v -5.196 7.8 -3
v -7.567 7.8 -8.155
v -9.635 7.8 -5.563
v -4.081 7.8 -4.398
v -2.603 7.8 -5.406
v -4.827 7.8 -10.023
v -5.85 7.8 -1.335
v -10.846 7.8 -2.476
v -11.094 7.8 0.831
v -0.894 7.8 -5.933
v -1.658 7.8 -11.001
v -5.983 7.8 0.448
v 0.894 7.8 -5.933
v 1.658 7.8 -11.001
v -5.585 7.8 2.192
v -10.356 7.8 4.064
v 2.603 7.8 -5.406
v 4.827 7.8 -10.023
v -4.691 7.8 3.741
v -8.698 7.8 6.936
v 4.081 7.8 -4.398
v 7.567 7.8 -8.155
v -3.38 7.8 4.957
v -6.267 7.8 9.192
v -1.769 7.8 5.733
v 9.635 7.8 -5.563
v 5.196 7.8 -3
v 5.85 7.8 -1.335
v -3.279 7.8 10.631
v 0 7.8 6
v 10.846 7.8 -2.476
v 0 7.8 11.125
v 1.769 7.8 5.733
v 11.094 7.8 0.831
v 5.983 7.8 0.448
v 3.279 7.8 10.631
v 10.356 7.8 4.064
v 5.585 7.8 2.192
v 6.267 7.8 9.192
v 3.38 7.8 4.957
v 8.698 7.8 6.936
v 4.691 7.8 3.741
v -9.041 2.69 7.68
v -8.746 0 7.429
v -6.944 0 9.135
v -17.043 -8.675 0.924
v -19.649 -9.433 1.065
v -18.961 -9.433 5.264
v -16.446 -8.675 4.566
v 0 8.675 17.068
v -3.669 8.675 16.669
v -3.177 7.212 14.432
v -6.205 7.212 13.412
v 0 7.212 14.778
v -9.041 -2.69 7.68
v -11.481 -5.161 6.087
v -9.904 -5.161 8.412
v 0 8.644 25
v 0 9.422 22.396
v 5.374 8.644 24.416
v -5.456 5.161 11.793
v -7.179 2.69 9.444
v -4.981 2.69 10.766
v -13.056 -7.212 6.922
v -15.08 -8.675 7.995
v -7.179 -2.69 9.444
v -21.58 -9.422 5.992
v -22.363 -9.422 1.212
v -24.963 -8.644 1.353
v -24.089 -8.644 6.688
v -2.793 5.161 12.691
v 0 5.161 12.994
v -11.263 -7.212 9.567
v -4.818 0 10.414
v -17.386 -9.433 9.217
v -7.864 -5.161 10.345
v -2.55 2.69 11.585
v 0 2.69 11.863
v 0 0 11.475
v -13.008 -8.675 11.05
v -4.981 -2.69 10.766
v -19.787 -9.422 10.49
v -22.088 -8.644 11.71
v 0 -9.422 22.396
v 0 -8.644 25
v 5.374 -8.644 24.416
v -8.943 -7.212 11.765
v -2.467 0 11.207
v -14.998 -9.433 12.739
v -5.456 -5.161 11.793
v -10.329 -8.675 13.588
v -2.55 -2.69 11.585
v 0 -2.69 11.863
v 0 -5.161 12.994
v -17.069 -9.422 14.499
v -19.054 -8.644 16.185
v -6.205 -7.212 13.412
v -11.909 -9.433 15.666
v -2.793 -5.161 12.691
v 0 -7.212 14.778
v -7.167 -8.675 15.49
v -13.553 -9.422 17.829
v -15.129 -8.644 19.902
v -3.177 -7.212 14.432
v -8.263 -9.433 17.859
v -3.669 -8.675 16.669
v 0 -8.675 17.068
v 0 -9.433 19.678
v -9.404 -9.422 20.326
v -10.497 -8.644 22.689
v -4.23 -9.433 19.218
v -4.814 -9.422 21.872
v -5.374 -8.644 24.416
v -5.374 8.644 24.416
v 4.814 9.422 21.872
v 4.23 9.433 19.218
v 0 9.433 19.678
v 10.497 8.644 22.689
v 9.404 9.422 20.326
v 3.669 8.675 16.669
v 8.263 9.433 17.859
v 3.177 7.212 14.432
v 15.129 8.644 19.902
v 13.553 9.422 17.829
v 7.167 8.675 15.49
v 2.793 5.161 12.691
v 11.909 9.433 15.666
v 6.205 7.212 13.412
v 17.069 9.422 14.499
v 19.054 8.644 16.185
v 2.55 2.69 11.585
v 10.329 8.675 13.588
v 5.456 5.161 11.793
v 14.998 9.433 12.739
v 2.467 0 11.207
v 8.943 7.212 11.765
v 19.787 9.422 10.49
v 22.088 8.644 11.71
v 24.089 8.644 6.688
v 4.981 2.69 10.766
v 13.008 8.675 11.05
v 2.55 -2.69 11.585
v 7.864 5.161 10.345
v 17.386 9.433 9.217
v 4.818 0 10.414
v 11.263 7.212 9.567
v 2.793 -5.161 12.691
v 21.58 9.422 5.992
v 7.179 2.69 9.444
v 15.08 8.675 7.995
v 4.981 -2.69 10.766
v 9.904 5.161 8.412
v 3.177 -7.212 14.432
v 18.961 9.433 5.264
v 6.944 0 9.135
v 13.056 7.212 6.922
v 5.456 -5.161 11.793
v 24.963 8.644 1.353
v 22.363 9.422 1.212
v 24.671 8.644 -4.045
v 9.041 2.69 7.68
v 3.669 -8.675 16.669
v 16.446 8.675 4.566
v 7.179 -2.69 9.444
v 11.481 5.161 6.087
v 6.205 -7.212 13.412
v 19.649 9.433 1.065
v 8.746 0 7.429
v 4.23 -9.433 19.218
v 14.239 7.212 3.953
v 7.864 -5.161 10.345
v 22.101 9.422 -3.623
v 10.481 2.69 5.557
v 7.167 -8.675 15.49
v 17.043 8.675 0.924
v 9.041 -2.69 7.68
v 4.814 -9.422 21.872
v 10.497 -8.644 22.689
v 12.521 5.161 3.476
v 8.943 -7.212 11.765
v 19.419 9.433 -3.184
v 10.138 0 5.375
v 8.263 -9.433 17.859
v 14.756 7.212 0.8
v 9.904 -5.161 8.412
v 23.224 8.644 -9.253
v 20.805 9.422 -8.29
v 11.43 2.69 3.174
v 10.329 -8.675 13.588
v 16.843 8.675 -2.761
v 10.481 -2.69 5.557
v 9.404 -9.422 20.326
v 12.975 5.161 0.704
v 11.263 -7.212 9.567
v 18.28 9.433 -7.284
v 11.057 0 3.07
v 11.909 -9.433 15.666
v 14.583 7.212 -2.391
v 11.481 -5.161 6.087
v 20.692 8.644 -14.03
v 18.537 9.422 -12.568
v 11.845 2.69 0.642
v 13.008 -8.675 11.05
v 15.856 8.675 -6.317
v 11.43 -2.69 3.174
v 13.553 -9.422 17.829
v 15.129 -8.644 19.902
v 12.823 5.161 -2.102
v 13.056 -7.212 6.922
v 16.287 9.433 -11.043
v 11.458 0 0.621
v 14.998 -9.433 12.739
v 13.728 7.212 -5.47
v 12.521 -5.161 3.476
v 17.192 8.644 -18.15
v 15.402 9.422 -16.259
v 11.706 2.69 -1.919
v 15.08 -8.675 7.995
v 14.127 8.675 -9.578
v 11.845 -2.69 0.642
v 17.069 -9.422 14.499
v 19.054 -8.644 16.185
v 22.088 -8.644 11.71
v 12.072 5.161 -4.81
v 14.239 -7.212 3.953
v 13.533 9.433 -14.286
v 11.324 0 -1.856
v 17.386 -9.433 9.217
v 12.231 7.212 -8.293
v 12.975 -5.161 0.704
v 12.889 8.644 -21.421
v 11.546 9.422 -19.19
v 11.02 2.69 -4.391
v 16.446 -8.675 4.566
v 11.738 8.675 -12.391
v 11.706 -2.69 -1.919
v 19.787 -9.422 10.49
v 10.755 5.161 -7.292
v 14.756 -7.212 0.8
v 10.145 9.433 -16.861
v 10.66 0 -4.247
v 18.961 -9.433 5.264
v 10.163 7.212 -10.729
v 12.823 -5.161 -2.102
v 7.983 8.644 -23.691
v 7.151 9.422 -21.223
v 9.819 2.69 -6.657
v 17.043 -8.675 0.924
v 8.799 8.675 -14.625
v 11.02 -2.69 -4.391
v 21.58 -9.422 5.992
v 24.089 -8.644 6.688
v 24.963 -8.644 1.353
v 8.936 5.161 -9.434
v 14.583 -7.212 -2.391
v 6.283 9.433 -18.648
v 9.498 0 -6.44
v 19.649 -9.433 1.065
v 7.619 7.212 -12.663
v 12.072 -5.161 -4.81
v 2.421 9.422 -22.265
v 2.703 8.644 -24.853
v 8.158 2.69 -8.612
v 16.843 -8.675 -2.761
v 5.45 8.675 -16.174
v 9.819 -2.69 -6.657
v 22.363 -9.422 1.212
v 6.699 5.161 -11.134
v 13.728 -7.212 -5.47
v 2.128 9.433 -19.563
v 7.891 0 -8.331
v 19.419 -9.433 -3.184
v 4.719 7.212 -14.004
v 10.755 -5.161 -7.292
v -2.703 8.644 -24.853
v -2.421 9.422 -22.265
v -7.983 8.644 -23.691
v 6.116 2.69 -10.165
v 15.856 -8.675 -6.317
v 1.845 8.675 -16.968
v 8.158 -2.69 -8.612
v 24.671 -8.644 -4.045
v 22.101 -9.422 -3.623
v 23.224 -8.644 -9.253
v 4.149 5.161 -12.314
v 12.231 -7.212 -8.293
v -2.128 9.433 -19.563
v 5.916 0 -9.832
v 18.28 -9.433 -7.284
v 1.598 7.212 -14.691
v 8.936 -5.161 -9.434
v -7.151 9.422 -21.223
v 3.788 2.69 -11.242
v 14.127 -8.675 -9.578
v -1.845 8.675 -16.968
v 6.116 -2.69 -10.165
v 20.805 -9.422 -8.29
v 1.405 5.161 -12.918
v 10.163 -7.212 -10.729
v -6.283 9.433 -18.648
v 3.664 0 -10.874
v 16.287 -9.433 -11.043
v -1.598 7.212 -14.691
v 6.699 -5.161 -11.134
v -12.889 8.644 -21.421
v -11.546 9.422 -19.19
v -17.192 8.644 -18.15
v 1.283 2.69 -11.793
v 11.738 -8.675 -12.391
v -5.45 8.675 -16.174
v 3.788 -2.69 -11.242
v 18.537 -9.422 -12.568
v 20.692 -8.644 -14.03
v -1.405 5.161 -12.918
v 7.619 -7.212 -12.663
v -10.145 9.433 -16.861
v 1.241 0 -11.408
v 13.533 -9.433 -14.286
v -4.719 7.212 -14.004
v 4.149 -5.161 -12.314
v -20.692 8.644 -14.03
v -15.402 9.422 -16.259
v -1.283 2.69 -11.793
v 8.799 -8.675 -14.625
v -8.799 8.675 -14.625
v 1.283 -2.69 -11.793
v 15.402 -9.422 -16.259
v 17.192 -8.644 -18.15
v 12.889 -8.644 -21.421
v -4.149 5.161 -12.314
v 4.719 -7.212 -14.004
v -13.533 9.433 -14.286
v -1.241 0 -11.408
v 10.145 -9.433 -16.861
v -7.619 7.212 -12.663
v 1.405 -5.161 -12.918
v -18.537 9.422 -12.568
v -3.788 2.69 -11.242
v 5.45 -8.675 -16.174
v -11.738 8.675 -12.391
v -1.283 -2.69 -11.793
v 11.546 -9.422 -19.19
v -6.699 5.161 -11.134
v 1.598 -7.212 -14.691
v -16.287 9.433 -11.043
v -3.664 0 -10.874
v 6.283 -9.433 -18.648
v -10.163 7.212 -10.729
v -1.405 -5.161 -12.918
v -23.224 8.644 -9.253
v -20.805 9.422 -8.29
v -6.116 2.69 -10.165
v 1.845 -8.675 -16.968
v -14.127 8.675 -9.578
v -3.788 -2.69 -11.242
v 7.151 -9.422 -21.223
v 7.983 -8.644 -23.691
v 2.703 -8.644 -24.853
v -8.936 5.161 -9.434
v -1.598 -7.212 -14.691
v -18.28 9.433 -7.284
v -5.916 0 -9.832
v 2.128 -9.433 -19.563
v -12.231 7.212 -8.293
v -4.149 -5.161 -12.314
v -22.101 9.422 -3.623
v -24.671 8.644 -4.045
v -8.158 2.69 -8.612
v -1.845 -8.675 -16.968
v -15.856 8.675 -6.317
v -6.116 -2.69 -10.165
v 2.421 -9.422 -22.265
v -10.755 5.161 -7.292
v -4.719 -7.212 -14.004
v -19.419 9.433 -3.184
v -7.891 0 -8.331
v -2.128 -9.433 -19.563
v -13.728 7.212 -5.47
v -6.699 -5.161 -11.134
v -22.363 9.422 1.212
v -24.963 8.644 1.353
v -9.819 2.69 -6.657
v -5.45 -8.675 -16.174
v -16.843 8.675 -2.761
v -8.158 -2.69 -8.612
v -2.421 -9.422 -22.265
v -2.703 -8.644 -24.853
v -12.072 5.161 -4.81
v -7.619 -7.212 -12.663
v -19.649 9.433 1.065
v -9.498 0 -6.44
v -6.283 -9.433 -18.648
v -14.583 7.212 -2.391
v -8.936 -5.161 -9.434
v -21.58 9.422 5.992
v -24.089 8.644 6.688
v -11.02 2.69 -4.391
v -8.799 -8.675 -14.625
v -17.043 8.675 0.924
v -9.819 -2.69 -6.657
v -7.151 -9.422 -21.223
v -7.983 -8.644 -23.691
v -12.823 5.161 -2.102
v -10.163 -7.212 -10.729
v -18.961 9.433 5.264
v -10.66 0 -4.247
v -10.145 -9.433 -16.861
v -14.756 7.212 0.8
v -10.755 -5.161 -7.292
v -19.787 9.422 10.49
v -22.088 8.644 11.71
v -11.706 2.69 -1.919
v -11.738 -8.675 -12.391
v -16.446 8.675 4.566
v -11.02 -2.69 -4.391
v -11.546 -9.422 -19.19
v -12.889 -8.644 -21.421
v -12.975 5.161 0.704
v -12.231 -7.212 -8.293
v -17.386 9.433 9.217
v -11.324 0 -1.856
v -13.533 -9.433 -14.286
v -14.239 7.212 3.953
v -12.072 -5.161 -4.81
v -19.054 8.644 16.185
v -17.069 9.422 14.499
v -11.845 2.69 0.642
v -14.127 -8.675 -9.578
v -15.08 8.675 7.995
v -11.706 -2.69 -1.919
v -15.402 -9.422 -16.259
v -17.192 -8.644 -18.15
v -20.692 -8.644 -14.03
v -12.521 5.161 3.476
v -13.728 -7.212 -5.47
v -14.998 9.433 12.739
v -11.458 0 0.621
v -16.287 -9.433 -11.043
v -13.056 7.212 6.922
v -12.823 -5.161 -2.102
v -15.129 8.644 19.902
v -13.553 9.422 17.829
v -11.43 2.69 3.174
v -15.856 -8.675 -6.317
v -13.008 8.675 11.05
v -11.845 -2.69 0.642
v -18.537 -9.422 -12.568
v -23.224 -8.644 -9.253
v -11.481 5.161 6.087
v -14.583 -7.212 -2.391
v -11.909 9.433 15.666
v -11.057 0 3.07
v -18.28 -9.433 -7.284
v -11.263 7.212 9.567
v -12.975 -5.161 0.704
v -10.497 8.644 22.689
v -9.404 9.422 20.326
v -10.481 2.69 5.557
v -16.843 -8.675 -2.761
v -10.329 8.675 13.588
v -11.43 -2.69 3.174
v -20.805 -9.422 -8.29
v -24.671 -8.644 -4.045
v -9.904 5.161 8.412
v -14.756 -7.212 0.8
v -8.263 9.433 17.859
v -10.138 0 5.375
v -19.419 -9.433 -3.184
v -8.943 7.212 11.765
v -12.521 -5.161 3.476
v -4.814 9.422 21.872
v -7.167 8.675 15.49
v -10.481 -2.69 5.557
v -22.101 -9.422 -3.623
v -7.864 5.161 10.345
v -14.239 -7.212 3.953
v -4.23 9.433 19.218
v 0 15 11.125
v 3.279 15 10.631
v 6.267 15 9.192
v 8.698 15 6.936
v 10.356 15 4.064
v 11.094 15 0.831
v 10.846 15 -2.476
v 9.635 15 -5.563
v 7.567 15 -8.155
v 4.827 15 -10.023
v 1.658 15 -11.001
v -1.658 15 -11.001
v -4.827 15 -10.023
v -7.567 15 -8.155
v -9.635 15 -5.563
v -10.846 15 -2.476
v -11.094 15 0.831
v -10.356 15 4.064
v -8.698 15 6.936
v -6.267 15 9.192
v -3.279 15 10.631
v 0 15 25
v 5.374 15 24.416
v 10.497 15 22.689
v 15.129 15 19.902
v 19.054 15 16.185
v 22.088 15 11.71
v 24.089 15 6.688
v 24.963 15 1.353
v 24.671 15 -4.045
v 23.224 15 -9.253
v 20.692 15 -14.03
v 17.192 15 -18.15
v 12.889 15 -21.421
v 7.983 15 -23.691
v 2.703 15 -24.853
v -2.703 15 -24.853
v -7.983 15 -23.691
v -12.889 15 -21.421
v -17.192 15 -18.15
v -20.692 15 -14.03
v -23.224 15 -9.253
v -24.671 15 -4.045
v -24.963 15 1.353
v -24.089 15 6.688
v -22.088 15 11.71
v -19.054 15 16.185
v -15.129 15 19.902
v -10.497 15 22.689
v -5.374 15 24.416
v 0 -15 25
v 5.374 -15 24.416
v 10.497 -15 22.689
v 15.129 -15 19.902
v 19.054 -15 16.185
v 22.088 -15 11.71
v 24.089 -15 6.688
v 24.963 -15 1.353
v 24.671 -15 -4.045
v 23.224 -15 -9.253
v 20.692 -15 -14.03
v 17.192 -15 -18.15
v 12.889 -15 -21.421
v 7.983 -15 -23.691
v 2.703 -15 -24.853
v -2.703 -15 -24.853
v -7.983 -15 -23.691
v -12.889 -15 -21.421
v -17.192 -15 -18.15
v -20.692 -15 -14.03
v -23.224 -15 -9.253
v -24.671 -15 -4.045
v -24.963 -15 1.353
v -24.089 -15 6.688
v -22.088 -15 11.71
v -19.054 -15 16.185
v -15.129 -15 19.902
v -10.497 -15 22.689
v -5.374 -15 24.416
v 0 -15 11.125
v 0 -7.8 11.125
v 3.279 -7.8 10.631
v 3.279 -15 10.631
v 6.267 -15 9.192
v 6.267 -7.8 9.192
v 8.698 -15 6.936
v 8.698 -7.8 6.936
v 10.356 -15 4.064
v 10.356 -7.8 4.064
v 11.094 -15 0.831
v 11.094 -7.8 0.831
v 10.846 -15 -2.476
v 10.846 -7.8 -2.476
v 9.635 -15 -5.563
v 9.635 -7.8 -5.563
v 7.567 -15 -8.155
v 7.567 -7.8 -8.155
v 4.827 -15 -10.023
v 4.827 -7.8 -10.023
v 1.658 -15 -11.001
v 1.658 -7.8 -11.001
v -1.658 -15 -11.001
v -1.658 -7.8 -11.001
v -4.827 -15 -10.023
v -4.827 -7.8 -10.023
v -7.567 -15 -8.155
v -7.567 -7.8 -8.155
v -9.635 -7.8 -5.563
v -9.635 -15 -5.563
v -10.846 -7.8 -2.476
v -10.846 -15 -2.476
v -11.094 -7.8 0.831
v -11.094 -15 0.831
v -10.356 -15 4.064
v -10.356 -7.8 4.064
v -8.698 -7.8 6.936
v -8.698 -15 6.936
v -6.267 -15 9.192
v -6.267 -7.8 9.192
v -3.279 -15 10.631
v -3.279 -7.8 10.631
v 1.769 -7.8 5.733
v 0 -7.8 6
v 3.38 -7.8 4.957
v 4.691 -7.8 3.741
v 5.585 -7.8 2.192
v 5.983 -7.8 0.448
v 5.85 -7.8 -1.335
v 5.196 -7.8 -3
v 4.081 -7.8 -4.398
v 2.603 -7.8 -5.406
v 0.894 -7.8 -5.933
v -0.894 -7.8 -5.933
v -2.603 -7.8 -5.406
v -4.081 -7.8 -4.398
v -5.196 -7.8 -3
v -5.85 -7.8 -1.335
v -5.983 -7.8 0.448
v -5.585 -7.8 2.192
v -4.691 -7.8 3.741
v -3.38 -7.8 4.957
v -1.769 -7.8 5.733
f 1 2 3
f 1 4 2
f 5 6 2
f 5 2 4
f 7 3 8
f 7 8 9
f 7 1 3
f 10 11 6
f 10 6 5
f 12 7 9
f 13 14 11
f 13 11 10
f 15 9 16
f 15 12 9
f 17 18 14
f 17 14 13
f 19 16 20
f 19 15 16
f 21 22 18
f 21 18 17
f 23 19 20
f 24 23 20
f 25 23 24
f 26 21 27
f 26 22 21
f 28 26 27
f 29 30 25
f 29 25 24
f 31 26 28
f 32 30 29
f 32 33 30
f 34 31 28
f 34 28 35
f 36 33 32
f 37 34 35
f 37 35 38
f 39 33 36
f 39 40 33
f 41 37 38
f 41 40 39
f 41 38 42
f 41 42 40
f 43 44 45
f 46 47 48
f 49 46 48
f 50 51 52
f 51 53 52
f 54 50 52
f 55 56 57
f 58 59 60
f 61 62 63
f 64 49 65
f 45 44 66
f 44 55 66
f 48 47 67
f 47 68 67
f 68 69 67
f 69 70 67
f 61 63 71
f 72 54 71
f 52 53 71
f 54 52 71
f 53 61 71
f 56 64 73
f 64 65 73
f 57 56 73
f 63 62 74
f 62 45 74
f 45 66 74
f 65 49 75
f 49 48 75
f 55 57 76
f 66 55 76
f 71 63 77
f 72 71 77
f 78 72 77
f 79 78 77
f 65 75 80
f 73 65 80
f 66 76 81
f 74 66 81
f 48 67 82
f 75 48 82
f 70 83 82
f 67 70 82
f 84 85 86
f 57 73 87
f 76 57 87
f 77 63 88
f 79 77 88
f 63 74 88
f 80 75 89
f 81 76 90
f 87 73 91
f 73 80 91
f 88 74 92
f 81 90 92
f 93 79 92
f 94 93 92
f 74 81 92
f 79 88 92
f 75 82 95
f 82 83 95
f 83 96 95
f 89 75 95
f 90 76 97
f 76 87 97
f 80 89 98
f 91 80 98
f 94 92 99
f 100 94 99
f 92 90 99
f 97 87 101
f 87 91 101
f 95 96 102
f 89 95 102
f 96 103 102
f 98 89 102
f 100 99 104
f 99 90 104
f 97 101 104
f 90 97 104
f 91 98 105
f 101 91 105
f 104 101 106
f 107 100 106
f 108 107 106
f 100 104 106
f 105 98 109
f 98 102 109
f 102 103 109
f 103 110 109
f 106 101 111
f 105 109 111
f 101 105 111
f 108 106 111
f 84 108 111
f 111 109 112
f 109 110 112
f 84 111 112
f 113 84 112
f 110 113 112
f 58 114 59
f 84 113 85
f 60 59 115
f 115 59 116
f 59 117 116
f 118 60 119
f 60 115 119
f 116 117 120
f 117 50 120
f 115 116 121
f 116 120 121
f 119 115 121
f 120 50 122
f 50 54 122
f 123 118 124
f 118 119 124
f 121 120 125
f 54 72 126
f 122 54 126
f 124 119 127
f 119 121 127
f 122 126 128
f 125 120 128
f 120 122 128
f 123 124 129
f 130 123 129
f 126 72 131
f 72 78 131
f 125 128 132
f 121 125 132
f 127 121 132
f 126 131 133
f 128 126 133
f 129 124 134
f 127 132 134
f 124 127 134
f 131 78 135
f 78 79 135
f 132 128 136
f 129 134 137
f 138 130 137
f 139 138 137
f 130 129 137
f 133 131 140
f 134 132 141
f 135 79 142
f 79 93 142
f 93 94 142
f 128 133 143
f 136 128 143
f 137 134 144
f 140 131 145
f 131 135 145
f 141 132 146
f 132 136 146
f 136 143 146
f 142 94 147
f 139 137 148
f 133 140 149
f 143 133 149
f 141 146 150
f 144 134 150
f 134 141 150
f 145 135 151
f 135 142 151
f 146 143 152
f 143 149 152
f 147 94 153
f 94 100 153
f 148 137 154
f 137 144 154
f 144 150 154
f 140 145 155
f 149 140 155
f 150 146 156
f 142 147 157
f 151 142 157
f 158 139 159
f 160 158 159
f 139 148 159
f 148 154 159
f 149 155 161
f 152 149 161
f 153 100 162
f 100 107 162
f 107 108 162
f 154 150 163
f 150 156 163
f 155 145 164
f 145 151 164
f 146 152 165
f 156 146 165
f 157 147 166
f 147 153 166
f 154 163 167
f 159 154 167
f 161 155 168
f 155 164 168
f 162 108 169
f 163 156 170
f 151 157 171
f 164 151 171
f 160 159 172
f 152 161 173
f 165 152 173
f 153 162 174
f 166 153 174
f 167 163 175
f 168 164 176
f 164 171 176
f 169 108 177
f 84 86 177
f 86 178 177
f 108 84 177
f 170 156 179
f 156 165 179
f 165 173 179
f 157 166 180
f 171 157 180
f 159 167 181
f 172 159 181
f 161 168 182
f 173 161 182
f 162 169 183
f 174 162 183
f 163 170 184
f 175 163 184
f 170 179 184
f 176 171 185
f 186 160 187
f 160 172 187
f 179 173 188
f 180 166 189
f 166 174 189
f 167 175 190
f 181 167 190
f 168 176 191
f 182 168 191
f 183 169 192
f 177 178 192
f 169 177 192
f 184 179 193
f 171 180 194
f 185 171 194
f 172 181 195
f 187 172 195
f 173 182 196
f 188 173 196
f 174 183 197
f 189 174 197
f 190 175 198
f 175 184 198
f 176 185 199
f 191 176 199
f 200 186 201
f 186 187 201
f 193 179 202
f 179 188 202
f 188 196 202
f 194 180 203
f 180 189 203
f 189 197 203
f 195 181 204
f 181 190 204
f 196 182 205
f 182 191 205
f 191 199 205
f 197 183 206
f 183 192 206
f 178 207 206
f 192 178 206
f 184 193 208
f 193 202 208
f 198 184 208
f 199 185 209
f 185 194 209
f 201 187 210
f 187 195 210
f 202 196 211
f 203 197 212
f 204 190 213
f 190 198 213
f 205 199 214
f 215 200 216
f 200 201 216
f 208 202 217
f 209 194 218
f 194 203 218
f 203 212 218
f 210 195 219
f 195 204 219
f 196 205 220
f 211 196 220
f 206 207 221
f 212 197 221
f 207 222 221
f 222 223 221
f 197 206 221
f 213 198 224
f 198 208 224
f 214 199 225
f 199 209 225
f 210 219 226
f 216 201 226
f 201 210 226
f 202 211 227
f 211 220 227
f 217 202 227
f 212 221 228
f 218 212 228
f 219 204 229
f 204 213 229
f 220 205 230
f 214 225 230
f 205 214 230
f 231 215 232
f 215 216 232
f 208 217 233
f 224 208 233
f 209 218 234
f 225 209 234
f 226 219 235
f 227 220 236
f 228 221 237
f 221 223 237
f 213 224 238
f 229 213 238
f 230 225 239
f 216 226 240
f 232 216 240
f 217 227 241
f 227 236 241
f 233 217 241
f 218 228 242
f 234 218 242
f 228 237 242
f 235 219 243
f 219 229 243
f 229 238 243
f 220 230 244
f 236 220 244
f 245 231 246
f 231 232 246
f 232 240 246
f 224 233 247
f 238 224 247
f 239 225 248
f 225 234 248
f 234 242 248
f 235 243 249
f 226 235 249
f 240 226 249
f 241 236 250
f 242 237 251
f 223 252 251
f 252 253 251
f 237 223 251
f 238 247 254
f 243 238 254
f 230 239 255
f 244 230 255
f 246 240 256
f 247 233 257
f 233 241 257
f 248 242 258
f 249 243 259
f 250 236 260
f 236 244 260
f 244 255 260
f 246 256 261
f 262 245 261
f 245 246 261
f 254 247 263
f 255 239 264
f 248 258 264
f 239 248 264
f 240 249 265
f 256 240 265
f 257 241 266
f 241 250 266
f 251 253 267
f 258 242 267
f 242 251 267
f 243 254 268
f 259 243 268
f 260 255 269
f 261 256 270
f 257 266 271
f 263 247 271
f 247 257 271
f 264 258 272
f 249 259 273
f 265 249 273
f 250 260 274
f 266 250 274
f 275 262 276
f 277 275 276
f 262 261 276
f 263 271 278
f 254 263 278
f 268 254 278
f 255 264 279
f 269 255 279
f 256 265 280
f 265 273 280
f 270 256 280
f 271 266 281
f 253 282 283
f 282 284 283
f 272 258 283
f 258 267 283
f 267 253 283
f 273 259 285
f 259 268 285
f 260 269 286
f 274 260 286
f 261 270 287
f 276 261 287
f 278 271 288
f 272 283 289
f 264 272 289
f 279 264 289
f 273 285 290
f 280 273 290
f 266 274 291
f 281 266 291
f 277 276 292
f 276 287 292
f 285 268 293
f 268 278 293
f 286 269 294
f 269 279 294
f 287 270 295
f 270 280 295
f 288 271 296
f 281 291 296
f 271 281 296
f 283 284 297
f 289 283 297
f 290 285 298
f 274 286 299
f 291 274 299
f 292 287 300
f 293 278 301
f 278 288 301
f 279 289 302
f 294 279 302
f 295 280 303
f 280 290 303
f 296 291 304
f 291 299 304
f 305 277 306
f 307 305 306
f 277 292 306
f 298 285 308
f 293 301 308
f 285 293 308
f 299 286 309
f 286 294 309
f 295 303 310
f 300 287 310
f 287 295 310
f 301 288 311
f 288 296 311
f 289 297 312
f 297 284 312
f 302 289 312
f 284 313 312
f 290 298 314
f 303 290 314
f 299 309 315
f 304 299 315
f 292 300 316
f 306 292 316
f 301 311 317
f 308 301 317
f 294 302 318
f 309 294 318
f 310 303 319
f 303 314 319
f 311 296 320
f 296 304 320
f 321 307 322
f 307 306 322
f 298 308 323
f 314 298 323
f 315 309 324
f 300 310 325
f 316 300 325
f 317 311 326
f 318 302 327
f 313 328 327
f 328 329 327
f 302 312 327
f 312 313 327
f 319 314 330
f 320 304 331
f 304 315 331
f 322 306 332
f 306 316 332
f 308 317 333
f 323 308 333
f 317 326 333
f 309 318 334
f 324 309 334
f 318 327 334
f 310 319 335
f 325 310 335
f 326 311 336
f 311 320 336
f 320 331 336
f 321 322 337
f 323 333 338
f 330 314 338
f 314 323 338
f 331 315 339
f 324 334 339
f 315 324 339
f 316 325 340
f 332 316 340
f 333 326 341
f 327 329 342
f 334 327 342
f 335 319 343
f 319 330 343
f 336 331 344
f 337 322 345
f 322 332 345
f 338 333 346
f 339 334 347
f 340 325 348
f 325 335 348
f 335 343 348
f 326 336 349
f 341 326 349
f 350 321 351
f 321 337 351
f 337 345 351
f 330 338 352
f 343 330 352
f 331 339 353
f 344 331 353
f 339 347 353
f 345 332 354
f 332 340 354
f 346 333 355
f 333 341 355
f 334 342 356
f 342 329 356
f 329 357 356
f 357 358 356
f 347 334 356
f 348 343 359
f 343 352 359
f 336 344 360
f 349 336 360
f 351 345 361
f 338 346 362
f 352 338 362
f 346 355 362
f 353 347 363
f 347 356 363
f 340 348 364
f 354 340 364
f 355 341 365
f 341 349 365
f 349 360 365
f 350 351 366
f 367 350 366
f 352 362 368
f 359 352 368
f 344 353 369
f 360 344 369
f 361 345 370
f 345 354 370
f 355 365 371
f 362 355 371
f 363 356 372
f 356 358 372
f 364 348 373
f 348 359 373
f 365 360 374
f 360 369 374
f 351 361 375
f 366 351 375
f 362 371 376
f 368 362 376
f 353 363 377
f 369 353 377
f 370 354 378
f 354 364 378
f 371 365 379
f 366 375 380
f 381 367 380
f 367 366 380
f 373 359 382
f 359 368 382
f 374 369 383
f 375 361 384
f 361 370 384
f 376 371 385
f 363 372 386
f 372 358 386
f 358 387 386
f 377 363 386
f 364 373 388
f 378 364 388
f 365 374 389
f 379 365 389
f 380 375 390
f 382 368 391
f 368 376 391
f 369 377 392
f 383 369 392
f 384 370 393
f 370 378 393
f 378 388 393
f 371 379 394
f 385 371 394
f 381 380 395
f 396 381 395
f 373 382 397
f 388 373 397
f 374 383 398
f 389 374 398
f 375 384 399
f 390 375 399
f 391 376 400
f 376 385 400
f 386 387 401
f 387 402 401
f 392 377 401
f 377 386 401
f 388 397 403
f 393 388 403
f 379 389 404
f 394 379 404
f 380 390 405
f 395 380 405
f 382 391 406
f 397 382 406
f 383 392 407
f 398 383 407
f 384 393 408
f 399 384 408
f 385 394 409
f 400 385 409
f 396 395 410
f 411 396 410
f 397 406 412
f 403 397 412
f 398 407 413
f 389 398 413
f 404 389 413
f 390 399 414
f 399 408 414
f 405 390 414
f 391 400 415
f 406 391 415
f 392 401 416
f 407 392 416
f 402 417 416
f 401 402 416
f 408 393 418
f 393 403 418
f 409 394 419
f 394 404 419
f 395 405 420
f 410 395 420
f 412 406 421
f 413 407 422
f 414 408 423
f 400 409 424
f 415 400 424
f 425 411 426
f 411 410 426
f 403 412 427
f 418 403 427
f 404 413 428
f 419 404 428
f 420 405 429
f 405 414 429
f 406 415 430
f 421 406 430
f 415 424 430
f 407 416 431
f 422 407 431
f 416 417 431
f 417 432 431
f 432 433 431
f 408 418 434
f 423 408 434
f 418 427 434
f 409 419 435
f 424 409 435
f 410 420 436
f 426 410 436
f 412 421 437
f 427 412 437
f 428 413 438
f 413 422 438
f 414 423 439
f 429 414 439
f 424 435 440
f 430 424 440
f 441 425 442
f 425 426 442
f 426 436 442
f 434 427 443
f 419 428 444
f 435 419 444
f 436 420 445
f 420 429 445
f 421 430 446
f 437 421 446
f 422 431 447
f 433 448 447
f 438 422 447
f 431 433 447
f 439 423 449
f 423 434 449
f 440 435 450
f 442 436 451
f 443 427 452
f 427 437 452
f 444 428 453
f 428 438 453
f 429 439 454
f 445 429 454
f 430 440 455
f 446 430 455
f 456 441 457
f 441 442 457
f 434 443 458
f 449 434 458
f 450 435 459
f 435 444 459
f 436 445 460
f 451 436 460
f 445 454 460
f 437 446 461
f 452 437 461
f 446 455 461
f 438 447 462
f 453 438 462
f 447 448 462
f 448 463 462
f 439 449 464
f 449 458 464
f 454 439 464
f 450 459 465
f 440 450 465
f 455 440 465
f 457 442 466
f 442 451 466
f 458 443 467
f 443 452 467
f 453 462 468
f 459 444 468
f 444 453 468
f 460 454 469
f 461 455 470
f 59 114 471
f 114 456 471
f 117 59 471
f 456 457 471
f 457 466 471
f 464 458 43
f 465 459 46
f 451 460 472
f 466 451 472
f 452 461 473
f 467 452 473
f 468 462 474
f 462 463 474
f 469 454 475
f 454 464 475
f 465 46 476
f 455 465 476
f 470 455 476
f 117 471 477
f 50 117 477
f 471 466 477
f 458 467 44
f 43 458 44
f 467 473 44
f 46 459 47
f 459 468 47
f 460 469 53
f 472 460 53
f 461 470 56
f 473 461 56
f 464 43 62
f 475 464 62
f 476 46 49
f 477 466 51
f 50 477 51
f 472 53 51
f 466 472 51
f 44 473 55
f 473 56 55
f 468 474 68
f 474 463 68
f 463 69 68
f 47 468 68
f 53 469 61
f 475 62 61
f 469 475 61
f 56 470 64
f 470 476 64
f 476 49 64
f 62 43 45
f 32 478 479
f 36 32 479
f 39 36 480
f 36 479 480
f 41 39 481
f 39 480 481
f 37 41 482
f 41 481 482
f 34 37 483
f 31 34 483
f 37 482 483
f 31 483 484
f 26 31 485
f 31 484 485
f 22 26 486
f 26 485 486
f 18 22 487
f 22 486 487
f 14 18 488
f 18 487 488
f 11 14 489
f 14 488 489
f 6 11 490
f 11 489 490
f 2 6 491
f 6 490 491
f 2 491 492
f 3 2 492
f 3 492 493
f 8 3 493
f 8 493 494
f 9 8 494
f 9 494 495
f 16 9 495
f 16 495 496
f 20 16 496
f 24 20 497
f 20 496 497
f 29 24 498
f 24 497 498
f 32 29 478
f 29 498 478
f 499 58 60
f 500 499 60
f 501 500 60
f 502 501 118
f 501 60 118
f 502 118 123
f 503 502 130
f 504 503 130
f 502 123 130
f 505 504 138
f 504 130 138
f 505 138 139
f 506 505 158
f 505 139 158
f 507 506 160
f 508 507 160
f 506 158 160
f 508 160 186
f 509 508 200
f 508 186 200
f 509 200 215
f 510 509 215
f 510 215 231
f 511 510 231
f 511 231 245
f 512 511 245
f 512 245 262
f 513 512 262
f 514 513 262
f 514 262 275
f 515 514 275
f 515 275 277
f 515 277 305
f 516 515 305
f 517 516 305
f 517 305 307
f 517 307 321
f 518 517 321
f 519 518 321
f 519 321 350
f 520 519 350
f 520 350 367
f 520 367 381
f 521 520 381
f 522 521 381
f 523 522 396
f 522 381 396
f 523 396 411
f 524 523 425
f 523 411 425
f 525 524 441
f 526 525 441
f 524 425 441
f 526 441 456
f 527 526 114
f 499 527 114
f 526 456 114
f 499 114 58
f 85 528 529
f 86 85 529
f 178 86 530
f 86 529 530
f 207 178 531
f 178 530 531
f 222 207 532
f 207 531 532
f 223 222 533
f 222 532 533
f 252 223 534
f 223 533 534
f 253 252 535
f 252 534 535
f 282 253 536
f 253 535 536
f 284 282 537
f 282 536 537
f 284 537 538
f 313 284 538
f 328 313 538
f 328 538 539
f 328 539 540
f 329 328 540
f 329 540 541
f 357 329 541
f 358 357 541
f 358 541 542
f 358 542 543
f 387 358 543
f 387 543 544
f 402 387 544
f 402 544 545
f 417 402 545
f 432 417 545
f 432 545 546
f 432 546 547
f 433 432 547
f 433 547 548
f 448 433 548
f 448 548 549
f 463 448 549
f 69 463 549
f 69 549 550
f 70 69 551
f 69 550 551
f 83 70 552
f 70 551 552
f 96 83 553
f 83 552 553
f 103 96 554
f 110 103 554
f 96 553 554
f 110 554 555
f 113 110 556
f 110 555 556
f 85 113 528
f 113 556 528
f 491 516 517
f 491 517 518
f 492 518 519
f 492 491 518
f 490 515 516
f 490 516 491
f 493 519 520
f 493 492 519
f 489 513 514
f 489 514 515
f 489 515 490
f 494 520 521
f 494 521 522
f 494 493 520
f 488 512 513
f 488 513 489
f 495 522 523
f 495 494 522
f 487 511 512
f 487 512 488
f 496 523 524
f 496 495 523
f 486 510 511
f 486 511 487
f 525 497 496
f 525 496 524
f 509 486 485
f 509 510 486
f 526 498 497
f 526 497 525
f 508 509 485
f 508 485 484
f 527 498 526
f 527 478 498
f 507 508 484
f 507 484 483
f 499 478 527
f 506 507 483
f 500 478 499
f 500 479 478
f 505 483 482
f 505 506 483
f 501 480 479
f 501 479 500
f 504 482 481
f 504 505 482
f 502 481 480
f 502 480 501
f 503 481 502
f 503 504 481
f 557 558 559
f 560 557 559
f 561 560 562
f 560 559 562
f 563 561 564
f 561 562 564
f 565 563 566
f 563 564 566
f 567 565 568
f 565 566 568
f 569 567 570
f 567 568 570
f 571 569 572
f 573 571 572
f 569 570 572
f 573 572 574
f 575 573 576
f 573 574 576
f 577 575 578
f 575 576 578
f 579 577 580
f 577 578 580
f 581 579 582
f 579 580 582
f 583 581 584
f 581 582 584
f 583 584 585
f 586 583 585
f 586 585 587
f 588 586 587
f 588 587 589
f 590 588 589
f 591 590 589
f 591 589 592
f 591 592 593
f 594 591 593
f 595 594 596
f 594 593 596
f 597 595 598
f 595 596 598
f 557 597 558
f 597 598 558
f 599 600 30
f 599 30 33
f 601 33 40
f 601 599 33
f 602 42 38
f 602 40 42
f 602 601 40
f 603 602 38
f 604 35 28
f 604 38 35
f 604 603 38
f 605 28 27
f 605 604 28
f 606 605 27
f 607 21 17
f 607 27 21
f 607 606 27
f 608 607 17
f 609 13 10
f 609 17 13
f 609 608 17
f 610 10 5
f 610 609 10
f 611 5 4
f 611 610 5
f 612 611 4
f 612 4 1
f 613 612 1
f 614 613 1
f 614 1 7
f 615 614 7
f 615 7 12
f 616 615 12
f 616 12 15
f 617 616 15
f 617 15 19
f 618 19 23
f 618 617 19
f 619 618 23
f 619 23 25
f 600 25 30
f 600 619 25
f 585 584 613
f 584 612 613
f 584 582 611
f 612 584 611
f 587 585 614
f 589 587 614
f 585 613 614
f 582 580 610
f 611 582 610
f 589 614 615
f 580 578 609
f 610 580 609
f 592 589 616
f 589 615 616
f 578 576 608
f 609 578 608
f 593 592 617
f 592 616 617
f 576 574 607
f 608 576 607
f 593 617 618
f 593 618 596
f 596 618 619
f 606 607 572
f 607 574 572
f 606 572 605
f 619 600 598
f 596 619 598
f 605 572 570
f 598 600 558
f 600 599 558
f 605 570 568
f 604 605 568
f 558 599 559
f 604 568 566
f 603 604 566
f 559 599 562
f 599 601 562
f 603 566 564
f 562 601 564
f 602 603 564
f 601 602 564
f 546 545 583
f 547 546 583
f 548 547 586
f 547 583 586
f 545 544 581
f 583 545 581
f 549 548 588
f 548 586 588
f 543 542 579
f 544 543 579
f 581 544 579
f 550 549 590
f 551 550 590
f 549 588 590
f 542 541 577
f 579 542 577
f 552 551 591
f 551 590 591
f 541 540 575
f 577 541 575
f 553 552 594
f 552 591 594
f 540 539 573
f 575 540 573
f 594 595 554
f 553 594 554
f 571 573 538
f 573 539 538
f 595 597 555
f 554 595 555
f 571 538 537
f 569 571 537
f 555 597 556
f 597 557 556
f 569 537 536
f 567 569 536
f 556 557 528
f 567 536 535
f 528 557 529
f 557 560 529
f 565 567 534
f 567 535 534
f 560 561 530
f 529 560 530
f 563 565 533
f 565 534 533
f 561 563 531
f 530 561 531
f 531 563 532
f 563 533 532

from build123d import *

# Parameters (mm, degrees)
BOSS_EXTRUDE1_DEPTH      = 15
BOSS_EXTRUDE1_DEPTH_BACK = 15
SKETCH1_R                = 25
SKETCH1_R_2              = 6
SKETCH2_R                = 9.525
CUT_EXTRUDE1_START       = 15
SKETCH3_R                = 11.125
CUT_EXTRUDE1_DEPTH       = 7.2
CUT_EXTRUDE2_START       = -7.8
SKETCH4_R                = 11.125
CUT_EXTRUDE2_DEPTH       = 7.2


with BuildPart() as part:
    # Sketch1 → Boss-Extrude1 (new, two sides: drawn at the far end of the back side and taken through both)
    with BuildSketch(Plane(origin=(0, 0, 0), x_dir=(1, 0, 0), z_dir=(0, 1, 0)).offset(-BOSS_EXTRUDE1_DEPTH_BACK)):
        with Locations(Location((0, 0, 0), (0, 0, 270))):
            Circle(SKETCH1_R)
        with Locations(Location((0, 0, 0), (0, 0, 270))):
            Circle(SKETCH1_R_2, mode=Mode.SUBTRACT)
    extrude(amount=BOSS_EXTRUDE1_DEPTH + BOSS_EXTRUDE1_DEPTH_BACK)

    # Sketch2 → Cut-Revolve1 (revolve, cut)
    with BuildSketch(Plane(origin=(0, 0, 0), x_dir=(0, 0, -1), z_dir=(1, 0, 0)), mode=Mode.PRIVATE) as cut_revolve1_sk:
        with Locations((21, 0)):
            Circle(SKETCH2_R)
    revolve(cut_revolve1_sk.sketch.rotate(Axis((0, 0, 0), (0, 1, 0)), 180), axis=Axis((0, 0, 0), (0, 1, 0)), mode=Mode.SUBTRACT)

    # Sketch3 → Cut-Extrude1 (cut)
    with BuildSketch(Plane(origin=(0, 0, 0), x_dir=(1, 0, 0), z_dir=(0, 1, 0)).offset(CUT_EXTRUDE1_START)):
        with Locations(Location((0, 0, 0), (0, 0, 270))):
            Circle(SKETCH3_R)
    extrude(amount=-CUT_EXTRUDE1_DEPTH, mode=Mode.SUBTRACT)

    # Sketch4 → Cut-Extrude2 (cut)
    with BuildSketch(Plane(origin=(0, 0, 0), x_dir=(1, 0, 0), z_dir=(0, 1, 0)).offset(CUT_EXTRUDE2_START)):
        with Locations(Location((0, 0, 0), (0, 0, 270))):
            Circle(SKETCH4_R)
    extrude(amount=-CUT_EXTRUDE2_DEPTH, mode=Mode.SUBTRACT)


solid = part.part
